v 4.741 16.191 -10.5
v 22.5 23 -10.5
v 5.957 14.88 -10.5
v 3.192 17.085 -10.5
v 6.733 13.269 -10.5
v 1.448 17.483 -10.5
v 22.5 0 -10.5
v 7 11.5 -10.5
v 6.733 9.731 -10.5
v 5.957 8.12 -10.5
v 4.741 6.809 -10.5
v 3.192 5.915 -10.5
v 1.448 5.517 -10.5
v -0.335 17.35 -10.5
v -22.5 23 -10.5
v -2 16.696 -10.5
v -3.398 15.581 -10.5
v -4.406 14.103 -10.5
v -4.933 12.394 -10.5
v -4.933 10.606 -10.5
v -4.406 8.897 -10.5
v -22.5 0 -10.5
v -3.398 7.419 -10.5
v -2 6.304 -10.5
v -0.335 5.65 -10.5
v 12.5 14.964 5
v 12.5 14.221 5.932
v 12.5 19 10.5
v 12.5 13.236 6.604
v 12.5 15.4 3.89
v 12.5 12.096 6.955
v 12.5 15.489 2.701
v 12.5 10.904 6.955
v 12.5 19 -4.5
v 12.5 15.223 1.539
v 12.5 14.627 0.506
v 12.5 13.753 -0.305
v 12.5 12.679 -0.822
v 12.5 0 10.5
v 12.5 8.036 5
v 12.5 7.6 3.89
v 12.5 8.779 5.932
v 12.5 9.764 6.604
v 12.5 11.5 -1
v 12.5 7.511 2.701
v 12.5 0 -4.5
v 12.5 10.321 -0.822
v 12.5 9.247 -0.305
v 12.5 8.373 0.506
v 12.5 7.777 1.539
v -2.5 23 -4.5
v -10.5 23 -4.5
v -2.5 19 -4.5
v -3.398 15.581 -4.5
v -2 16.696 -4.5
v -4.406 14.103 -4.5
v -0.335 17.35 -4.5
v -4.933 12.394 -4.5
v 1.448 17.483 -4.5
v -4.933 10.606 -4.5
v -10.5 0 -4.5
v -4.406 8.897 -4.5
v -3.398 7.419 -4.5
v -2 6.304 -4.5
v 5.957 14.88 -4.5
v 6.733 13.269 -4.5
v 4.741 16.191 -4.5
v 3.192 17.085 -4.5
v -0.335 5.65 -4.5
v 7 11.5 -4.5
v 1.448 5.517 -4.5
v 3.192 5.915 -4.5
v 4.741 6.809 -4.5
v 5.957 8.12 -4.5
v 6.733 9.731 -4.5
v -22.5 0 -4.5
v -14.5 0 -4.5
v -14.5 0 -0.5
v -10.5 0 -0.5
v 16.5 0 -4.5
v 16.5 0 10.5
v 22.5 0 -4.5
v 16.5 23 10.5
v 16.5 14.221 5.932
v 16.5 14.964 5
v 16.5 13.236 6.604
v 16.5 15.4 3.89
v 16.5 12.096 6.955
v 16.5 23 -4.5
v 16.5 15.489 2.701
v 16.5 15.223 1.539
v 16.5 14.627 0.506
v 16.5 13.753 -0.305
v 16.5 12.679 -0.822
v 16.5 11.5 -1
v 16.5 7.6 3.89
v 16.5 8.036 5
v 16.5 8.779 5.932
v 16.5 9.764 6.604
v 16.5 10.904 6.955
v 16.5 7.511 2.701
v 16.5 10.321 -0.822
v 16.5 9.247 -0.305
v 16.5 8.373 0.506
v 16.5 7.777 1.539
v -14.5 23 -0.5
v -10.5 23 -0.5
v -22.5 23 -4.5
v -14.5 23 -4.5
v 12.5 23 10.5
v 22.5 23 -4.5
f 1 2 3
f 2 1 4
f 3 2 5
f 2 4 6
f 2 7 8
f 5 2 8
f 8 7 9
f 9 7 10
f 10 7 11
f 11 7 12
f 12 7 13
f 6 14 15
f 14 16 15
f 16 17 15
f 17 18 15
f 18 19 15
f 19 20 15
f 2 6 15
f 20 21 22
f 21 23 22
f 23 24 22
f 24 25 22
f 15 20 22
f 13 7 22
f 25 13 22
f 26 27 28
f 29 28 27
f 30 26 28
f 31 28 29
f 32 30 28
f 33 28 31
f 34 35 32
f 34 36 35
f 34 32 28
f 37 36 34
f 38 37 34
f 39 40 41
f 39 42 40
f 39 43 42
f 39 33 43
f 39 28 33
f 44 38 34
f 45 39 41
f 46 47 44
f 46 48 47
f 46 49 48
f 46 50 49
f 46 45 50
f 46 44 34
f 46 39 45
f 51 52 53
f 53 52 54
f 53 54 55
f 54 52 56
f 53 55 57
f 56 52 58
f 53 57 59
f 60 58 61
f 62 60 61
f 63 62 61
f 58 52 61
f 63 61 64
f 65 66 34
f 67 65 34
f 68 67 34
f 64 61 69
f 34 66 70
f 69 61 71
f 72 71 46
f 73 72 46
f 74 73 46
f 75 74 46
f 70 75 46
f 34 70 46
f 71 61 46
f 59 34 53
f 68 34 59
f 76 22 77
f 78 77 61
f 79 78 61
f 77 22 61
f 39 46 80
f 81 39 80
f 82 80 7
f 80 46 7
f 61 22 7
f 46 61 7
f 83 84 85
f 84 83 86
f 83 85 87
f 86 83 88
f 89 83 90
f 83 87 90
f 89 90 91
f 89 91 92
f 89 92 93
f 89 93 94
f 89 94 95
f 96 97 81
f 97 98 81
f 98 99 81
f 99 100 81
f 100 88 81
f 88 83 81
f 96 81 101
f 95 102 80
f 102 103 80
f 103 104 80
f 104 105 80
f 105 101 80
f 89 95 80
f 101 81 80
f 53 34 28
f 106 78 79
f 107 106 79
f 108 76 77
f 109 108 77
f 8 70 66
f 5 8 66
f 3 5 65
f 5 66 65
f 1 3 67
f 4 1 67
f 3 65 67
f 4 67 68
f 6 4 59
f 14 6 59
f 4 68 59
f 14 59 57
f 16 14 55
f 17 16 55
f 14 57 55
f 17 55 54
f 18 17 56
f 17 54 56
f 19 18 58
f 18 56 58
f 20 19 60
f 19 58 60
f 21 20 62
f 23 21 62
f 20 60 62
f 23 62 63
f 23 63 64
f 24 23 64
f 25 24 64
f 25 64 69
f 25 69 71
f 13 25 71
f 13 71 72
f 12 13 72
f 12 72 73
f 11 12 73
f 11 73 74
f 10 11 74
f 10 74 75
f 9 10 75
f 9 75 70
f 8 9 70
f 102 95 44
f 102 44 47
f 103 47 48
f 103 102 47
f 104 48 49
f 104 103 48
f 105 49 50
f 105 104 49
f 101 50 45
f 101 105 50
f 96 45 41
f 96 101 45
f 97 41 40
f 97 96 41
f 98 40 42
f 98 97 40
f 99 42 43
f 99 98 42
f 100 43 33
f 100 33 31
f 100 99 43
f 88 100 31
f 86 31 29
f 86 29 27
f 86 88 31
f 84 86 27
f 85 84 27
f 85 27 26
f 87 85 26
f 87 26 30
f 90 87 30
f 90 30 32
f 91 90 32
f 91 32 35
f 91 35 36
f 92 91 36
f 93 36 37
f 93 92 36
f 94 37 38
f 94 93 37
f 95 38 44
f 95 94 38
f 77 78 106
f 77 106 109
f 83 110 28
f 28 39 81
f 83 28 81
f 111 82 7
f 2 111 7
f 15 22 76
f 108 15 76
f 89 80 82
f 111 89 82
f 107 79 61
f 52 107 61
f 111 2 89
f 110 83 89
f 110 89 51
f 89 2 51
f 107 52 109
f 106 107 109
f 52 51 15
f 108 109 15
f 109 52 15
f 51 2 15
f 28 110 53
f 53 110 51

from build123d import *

# Parameters (mm, degrees)
SKETCH_1_W          = 4
SKETCH_1_H          = 4
SKETCH_1_H_2        = 15
EXTRUDE_1_DEPTH     = 23
EXTRUDE_2_DEPTH     = 4
SKETCH_3_R          = 6
CUT_EXTRUDE_1_DEPTH = 36.5
SKETCH_4_R          = 4
CUT_EXTRUDE_2_DEPTH = 4


with BuildPart() as part:
    # Эскиз1 → Бобышка-Вытянуть1 (new body)
    with BuildSketch(Plane(origin=(0, 0, 0), x_dir=(1, 0, 0), z_dir=(0, 1, 0))):
        Polygon((22.5, 10.5), (-22.5, 10.5), (-22.5, 4.5), (-14.5, 4.5), (-10.5, 4.5), (12.5, 4.5), (16.5, 4.5), (22.5, 4.5), align=None)
        with Locations((-12.5, 2.5)):
            Rectangle(SKETCH_1_W, SKETCH_1_H)
        with Locations((14.5, -3)):
            Rectangle(SKETCH_1_W, SKETCH_1_H_2)
    extrude(amount=EXTRUDE_1_DEPTH)

    # Эскиз2 → Бобышка-Вытянуть2 (add)
    with BuildSketch(Plane(origin=(0, 23, 0), x_dir=(1, 0, 0), z_dir=(0, 1, 0))):
        Polygon((12.5, -10.5), (-2.5, 4.5), (12.5, 4.5), align=None)
    extrude(amount=-EXTRUDE_2_DEPTH)

    # Эскиз3 → Вырез-Вытянуть1 (cut, through all)
    with BuildSketch(Plane.XY.offset(-4.5)):
        with Locations((1, 11.5)):
            Circle(SKETCH_3_R)
    extrude(amount=-CUT_EXTRUDE_1_DEPTH, mode=Mode.SUBTRACT)

    # Эскиз4 → Вырез-Вытянуть2 (cut)
    with BuildSketch(Plane.ZY.offset(-16.5)):
        with Locations(Location((3, 11.5, 0), (0, 0, 180))):
            Circle(SKETCH_4_R)
    extrude(amount=CUT_EXTRUDE_2_DEPTH, mode=Mode.SUBTRACT)


solid = part.part
